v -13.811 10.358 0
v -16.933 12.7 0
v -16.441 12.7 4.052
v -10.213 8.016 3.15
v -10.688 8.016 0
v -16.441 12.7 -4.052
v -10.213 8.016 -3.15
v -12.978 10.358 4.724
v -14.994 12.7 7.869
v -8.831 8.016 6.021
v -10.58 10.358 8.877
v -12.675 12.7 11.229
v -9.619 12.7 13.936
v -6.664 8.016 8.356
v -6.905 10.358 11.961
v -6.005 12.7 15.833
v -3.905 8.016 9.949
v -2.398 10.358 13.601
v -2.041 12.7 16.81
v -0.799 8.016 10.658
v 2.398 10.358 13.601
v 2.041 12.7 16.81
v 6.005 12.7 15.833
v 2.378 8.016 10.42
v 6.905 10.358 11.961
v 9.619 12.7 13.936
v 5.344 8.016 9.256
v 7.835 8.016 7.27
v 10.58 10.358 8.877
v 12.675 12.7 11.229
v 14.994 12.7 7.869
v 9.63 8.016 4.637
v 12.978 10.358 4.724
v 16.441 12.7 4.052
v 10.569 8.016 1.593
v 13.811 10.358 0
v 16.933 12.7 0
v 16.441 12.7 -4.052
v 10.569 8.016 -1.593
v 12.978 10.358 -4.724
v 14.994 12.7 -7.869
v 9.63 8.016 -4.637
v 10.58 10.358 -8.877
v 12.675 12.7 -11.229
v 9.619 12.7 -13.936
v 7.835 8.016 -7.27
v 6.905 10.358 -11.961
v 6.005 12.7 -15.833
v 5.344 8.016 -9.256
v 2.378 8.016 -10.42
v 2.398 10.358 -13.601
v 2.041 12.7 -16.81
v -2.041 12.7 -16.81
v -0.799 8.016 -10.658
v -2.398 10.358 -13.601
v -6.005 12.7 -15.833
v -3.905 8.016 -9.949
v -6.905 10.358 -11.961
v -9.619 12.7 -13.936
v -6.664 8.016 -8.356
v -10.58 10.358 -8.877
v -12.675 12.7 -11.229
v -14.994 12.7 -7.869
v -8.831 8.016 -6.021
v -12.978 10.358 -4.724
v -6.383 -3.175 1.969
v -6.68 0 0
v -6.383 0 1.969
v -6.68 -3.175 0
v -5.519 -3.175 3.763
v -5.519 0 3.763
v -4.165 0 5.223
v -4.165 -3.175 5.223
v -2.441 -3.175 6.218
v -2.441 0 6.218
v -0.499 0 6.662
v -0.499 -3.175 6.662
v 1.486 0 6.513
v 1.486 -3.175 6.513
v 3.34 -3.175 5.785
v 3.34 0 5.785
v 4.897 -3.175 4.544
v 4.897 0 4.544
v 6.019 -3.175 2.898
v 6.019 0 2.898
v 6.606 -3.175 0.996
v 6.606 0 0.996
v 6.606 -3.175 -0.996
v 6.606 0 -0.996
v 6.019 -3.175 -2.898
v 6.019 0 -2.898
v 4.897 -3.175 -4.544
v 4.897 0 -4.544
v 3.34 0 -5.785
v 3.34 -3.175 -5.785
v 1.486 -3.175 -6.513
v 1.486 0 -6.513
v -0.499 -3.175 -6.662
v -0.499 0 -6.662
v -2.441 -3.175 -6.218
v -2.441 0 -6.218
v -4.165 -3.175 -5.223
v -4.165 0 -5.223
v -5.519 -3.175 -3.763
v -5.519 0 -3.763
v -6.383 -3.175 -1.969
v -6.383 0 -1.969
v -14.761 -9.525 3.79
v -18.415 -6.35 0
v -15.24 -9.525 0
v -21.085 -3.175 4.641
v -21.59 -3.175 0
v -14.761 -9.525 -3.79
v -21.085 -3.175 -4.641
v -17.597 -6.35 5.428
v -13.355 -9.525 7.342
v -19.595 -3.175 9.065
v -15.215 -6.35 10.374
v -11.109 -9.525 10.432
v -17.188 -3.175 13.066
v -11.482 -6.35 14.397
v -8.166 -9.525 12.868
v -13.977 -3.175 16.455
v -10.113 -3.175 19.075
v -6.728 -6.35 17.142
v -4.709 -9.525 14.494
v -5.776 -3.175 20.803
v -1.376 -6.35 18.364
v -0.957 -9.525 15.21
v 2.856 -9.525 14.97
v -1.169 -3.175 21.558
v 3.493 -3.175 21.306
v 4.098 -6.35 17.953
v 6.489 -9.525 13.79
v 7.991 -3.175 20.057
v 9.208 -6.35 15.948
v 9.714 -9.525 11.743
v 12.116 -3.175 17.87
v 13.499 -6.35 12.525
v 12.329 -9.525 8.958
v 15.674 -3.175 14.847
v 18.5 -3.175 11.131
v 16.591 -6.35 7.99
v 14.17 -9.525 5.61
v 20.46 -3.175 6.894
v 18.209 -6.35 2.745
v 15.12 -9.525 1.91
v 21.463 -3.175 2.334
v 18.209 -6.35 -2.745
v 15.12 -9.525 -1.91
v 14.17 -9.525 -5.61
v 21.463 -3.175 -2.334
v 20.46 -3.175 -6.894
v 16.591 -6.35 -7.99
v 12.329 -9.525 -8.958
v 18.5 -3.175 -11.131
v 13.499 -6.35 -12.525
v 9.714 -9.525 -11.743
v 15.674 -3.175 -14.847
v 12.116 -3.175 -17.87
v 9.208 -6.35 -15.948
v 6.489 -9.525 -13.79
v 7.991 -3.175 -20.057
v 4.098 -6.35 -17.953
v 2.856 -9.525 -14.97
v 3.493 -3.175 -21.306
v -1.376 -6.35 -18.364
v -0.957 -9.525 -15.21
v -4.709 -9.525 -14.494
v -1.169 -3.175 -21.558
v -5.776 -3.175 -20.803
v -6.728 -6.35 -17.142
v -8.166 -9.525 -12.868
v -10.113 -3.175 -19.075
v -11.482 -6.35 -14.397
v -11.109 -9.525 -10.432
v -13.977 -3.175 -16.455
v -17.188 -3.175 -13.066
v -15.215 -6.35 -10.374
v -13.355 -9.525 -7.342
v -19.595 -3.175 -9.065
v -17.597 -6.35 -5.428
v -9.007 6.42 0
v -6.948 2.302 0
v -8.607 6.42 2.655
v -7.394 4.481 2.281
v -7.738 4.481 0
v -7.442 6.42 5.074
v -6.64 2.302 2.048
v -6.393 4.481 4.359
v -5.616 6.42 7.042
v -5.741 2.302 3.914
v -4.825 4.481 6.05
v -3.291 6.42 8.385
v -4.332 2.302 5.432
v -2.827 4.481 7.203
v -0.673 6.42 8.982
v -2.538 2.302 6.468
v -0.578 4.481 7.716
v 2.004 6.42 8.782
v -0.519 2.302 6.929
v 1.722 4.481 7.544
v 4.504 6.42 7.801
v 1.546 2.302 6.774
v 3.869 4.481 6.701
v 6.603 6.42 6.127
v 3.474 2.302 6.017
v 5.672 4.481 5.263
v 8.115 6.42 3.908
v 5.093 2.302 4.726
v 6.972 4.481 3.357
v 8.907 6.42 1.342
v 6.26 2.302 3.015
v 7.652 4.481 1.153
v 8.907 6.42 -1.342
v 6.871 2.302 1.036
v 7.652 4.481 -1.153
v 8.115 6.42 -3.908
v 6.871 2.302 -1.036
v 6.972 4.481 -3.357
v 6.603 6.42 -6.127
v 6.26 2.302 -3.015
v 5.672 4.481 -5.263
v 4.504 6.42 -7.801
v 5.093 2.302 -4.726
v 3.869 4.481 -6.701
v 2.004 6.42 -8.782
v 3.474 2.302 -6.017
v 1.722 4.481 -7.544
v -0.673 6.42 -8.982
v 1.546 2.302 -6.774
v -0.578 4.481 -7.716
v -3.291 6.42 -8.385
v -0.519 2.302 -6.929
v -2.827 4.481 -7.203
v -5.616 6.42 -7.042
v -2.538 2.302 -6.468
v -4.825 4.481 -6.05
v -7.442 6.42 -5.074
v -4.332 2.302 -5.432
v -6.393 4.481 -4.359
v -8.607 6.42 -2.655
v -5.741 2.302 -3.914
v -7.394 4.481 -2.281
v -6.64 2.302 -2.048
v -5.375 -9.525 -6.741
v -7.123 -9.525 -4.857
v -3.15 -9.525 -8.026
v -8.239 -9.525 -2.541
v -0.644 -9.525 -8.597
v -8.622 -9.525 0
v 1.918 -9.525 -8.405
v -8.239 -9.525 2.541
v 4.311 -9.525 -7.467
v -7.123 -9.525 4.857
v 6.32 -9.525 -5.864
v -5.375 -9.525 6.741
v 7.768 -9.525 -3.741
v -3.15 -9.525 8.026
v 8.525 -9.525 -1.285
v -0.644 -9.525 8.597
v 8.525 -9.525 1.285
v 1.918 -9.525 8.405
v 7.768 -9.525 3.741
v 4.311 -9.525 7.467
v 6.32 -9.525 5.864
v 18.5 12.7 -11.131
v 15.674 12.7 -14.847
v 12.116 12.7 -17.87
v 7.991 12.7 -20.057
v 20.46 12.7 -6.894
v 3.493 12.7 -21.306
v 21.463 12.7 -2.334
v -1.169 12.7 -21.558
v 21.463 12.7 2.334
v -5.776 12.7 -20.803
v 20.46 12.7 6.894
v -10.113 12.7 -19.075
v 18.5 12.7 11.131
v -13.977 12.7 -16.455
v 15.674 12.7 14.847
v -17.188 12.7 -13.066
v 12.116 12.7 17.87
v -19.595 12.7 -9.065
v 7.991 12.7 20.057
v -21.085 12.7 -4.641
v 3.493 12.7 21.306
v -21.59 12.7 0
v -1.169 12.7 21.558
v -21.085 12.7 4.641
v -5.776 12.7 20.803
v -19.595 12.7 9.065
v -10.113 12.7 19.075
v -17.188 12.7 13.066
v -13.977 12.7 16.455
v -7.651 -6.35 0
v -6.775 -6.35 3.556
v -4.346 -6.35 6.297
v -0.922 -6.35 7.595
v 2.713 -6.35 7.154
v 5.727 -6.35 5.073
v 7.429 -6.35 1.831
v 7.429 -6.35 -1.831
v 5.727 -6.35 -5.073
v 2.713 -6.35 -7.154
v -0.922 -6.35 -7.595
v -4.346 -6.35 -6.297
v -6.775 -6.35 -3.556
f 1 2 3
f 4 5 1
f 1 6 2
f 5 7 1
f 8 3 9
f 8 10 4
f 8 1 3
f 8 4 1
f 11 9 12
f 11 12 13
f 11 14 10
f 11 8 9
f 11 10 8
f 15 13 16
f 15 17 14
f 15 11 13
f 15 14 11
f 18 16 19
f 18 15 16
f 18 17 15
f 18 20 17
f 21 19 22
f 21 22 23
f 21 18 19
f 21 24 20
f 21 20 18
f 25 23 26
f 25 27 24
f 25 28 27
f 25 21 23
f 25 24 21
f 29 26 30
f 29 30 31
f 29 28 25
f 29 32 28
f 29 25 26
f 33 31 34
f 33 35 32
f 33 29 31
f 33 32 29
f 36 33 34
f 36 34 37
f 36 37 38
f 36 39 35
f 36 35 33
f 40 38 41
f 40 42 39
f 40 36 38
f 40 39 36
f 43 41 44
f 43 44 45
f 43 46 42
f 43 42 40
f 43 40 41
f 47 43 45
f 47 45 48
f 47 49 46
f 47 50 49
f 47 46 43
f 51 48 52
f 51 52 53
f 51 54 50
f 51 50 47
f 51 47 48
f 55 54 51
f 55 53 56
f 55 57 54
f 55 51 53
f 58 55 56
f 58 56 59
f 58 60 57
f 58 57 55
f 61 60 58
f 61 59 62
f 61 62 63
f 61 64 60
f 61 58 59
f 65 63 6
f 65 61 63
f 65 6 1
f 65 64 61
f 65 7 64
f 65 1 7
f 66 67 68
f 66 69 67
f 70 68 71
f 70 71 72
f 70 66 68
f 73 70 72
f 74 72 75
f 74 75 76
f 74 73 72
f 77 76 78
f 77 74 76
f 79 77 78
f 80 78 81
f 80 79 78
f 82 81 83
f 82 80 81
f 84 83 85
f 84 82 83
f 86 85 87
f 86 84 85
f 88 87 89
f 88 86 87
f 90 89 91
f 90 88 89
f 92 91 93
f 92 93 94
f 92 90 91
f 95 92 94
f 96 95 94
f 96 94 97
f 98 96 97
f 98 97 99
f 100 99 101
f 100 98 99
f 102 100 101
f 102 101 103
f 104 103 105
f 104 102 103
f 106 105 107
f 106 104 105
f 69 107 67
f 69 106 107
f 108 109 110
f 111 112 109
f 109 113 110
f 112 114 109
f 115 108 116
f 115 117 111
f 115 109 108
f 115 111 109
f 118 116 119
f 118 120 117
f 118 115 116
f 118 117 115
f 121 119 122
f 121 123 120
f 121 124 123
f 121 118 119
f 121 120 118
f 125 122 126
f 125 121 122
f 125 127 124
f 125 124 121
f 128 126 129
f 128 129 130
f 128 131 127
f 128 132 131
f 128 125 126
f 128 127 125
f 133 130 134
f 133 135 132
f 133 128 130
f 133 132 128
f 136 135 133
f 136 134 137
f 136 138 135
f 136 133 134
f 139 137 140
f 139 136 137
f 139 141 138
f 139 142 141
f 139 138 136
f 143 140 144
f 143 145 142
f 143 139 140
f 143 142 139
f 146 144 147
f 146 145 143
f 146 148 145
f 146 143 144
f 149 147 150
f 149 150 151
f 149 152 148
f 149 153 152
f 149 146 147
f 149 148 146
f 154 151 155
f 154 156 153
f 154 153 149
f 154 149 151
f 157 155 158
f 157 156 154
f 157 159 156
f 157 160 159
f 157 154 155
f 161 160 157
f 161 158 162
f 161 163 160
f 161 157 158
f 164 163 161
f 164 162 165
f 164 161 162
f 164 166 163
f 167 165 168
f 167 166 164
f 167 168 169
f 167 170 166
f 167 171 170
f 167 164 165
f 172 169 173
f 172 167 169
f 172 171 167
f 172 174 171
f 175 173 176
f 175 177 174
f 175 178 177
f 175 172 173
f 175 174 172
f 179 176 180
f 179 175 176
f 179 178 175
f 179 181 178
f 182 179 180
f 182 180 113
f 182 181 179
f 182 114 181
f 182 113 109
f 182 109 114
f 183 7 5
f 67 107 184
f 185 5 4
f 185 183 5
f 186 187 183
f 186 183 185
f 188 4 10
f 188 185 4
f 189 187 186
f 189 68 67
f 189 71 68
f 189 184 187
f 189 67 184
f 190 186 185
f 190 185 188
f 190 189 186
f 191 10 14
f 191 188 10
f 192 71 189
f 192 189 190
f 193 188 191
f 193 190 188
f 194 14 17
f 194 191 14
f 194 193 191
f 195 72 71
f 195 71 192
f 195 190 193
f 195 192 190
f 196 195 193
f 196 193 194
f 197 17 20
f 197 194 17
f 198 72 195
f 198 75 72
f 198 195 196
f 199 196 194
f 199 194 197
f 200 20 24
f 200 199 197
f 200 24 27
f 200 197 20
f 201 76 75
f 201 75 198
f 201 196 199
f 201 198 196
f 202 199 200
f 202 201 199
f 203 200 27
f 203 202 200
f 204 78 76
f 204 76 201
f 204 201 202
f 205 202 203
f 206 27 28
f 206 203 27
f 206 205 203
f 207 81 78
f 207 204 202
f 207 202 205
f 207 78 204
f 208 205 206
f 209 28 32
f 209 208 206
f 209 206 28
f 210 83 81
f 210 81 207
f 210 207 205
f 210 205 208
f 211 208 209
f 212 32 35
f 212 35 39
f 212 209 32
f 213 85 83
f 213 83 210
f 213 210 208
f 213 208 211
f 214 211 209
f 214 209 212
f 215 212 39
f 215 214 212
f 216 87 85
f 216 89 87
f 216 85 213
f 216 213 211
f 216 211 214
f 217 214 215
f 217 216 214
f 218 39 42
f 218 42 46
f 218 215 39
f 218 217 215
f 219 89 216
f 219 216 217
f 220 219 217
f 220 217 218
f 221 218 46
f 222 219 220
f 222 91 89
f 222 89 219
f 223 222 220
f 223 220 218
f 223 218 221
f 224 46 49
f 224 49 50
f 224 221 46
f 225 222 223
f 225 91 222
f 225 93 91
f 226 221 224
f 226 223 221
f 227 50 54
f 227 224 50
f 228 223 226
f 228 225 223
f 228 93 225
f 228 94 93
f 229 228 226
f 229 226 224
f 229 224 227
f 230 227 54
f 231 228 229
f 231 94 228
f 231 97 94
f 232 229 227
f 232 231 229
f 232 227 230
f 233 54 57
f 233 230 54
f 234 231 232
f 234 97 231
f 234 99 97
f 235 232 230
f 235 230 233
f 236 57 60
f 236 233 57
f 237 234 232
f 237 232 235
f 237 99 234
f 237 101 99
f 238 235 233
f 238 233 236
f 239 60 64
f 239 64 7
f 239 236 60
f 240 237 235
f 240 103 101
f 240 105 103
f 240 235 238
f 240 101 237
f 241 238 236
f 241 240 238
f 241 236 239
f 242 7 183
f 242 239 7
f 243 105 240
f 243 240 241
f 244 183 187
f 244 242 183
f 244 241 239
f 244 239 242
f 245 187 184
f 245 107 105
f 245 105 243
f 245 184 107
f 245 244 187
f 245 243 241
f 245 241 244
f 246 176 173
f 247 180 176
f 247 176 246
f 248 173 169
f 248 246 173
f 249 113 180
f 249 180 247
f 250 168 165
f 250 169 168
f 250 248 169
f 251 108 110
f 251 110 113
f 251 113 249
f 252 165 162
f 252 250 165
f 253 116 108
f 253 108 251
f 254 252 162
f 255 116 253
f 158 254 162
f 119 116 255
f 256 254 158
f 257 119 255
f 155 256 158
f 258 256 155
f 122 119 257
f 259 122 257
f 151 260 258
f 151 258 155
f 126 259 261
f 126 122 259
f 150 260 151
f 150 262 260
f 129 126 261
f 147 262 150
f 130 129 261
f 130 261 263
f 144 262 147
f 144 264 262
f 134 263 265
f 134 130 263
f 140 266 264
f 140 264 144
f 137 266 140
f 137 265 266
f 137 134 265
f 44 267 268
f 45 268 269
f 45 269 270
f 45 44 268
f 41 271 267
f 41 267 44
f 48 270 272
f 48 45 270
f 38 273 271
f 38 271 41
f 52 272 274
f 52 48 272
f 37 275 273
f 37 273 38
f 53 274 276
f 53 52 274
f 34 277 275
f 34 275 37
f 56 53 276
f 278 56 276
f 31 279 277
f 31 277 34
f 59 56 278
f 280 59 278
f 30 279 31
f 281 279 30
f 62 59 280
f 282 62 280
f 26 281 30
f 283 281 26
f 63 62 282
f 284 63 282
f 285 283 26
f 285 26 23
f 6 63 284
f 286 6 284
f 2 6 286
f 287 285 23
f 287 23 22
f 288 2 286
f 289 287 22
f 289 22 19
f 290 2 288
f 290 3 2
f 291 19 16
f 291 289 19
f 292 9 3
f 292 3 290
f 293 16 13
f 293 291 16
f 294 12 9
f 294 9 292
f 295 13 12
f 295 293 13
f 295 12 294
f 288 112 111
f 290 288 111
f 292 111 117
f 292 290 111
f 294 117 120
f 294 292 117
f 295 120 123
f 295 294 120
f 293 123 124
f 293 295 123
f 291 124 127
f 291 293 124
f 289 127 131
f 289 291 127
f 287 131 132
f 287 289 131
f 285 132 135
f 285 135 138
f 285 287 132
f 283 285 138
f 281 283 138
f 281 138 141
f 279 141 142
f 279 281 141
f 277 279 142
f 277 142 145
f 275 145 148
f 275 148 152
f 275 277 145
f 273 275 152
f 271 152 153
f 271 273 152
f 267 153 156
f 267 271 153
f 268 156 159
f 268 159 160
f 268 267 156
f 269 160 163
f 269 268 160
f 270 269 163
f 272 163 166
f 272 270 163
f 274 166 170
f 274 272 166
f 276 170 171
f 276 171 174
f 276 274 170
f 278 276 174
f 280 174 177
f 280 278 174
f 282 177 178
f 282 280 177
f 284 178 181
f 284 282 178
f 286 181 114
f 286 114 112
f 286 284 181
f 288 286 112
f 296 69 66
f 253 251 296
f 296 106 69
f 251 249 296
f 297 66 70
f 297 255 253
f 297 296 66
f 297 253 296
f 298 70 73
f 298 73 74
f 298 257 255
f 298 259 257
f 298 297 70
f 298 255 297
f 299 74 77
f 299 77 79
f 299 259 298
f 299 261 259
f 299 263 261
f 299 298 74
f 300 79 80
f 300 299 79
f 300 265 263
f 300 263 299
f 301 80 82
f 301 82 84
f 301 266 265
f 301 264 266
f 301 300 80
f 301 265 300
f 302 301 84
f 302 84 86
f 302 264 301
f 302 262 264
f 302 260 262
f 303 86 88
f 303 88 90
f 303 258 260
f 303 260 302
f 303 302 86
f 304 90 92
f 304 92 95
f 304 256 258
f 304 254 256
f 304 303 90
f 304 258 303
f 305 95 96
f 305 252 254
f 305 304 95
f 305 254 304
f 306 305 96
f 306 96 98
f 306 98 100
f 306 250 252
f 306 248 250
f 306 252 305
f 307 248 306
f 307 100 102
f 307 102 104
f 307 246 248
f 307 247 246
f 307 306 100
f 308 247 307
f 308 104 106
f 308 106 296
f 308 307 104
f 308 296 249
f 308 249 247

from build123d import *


with BuildPart() as part:
    # Sketch1 → Revolve1 (revolve)
    with BuildSketch(Plane.XY):
        with BuildLine():
            Line((-16.933310091, 12.7), (-10.68830568, 8.01622926))
            ThreePointArc((-10.68830568, 8.01622926), (-7.738067215, 4.481206386), (-6.6802, 0))
            Line((-6.6802, 0), (-6.6802, -3.175))
            Line((-6.6802, -3.175), (-8.621589827, -9.525))
            Line((-8.621589827, -9.525), (-15.24, -9.525))
            Line((-15.24, -9.525), (-21.59, -3.175))
            Line((-21.59, -3.175), (-21.59, 12.7))
            Line((-21.59, 12.7), (-16.933310091, 12.7))
        make_face()
    revolve(axis=Axis((0, 0, 0), (0, 1, 0)))


solid = part.part
